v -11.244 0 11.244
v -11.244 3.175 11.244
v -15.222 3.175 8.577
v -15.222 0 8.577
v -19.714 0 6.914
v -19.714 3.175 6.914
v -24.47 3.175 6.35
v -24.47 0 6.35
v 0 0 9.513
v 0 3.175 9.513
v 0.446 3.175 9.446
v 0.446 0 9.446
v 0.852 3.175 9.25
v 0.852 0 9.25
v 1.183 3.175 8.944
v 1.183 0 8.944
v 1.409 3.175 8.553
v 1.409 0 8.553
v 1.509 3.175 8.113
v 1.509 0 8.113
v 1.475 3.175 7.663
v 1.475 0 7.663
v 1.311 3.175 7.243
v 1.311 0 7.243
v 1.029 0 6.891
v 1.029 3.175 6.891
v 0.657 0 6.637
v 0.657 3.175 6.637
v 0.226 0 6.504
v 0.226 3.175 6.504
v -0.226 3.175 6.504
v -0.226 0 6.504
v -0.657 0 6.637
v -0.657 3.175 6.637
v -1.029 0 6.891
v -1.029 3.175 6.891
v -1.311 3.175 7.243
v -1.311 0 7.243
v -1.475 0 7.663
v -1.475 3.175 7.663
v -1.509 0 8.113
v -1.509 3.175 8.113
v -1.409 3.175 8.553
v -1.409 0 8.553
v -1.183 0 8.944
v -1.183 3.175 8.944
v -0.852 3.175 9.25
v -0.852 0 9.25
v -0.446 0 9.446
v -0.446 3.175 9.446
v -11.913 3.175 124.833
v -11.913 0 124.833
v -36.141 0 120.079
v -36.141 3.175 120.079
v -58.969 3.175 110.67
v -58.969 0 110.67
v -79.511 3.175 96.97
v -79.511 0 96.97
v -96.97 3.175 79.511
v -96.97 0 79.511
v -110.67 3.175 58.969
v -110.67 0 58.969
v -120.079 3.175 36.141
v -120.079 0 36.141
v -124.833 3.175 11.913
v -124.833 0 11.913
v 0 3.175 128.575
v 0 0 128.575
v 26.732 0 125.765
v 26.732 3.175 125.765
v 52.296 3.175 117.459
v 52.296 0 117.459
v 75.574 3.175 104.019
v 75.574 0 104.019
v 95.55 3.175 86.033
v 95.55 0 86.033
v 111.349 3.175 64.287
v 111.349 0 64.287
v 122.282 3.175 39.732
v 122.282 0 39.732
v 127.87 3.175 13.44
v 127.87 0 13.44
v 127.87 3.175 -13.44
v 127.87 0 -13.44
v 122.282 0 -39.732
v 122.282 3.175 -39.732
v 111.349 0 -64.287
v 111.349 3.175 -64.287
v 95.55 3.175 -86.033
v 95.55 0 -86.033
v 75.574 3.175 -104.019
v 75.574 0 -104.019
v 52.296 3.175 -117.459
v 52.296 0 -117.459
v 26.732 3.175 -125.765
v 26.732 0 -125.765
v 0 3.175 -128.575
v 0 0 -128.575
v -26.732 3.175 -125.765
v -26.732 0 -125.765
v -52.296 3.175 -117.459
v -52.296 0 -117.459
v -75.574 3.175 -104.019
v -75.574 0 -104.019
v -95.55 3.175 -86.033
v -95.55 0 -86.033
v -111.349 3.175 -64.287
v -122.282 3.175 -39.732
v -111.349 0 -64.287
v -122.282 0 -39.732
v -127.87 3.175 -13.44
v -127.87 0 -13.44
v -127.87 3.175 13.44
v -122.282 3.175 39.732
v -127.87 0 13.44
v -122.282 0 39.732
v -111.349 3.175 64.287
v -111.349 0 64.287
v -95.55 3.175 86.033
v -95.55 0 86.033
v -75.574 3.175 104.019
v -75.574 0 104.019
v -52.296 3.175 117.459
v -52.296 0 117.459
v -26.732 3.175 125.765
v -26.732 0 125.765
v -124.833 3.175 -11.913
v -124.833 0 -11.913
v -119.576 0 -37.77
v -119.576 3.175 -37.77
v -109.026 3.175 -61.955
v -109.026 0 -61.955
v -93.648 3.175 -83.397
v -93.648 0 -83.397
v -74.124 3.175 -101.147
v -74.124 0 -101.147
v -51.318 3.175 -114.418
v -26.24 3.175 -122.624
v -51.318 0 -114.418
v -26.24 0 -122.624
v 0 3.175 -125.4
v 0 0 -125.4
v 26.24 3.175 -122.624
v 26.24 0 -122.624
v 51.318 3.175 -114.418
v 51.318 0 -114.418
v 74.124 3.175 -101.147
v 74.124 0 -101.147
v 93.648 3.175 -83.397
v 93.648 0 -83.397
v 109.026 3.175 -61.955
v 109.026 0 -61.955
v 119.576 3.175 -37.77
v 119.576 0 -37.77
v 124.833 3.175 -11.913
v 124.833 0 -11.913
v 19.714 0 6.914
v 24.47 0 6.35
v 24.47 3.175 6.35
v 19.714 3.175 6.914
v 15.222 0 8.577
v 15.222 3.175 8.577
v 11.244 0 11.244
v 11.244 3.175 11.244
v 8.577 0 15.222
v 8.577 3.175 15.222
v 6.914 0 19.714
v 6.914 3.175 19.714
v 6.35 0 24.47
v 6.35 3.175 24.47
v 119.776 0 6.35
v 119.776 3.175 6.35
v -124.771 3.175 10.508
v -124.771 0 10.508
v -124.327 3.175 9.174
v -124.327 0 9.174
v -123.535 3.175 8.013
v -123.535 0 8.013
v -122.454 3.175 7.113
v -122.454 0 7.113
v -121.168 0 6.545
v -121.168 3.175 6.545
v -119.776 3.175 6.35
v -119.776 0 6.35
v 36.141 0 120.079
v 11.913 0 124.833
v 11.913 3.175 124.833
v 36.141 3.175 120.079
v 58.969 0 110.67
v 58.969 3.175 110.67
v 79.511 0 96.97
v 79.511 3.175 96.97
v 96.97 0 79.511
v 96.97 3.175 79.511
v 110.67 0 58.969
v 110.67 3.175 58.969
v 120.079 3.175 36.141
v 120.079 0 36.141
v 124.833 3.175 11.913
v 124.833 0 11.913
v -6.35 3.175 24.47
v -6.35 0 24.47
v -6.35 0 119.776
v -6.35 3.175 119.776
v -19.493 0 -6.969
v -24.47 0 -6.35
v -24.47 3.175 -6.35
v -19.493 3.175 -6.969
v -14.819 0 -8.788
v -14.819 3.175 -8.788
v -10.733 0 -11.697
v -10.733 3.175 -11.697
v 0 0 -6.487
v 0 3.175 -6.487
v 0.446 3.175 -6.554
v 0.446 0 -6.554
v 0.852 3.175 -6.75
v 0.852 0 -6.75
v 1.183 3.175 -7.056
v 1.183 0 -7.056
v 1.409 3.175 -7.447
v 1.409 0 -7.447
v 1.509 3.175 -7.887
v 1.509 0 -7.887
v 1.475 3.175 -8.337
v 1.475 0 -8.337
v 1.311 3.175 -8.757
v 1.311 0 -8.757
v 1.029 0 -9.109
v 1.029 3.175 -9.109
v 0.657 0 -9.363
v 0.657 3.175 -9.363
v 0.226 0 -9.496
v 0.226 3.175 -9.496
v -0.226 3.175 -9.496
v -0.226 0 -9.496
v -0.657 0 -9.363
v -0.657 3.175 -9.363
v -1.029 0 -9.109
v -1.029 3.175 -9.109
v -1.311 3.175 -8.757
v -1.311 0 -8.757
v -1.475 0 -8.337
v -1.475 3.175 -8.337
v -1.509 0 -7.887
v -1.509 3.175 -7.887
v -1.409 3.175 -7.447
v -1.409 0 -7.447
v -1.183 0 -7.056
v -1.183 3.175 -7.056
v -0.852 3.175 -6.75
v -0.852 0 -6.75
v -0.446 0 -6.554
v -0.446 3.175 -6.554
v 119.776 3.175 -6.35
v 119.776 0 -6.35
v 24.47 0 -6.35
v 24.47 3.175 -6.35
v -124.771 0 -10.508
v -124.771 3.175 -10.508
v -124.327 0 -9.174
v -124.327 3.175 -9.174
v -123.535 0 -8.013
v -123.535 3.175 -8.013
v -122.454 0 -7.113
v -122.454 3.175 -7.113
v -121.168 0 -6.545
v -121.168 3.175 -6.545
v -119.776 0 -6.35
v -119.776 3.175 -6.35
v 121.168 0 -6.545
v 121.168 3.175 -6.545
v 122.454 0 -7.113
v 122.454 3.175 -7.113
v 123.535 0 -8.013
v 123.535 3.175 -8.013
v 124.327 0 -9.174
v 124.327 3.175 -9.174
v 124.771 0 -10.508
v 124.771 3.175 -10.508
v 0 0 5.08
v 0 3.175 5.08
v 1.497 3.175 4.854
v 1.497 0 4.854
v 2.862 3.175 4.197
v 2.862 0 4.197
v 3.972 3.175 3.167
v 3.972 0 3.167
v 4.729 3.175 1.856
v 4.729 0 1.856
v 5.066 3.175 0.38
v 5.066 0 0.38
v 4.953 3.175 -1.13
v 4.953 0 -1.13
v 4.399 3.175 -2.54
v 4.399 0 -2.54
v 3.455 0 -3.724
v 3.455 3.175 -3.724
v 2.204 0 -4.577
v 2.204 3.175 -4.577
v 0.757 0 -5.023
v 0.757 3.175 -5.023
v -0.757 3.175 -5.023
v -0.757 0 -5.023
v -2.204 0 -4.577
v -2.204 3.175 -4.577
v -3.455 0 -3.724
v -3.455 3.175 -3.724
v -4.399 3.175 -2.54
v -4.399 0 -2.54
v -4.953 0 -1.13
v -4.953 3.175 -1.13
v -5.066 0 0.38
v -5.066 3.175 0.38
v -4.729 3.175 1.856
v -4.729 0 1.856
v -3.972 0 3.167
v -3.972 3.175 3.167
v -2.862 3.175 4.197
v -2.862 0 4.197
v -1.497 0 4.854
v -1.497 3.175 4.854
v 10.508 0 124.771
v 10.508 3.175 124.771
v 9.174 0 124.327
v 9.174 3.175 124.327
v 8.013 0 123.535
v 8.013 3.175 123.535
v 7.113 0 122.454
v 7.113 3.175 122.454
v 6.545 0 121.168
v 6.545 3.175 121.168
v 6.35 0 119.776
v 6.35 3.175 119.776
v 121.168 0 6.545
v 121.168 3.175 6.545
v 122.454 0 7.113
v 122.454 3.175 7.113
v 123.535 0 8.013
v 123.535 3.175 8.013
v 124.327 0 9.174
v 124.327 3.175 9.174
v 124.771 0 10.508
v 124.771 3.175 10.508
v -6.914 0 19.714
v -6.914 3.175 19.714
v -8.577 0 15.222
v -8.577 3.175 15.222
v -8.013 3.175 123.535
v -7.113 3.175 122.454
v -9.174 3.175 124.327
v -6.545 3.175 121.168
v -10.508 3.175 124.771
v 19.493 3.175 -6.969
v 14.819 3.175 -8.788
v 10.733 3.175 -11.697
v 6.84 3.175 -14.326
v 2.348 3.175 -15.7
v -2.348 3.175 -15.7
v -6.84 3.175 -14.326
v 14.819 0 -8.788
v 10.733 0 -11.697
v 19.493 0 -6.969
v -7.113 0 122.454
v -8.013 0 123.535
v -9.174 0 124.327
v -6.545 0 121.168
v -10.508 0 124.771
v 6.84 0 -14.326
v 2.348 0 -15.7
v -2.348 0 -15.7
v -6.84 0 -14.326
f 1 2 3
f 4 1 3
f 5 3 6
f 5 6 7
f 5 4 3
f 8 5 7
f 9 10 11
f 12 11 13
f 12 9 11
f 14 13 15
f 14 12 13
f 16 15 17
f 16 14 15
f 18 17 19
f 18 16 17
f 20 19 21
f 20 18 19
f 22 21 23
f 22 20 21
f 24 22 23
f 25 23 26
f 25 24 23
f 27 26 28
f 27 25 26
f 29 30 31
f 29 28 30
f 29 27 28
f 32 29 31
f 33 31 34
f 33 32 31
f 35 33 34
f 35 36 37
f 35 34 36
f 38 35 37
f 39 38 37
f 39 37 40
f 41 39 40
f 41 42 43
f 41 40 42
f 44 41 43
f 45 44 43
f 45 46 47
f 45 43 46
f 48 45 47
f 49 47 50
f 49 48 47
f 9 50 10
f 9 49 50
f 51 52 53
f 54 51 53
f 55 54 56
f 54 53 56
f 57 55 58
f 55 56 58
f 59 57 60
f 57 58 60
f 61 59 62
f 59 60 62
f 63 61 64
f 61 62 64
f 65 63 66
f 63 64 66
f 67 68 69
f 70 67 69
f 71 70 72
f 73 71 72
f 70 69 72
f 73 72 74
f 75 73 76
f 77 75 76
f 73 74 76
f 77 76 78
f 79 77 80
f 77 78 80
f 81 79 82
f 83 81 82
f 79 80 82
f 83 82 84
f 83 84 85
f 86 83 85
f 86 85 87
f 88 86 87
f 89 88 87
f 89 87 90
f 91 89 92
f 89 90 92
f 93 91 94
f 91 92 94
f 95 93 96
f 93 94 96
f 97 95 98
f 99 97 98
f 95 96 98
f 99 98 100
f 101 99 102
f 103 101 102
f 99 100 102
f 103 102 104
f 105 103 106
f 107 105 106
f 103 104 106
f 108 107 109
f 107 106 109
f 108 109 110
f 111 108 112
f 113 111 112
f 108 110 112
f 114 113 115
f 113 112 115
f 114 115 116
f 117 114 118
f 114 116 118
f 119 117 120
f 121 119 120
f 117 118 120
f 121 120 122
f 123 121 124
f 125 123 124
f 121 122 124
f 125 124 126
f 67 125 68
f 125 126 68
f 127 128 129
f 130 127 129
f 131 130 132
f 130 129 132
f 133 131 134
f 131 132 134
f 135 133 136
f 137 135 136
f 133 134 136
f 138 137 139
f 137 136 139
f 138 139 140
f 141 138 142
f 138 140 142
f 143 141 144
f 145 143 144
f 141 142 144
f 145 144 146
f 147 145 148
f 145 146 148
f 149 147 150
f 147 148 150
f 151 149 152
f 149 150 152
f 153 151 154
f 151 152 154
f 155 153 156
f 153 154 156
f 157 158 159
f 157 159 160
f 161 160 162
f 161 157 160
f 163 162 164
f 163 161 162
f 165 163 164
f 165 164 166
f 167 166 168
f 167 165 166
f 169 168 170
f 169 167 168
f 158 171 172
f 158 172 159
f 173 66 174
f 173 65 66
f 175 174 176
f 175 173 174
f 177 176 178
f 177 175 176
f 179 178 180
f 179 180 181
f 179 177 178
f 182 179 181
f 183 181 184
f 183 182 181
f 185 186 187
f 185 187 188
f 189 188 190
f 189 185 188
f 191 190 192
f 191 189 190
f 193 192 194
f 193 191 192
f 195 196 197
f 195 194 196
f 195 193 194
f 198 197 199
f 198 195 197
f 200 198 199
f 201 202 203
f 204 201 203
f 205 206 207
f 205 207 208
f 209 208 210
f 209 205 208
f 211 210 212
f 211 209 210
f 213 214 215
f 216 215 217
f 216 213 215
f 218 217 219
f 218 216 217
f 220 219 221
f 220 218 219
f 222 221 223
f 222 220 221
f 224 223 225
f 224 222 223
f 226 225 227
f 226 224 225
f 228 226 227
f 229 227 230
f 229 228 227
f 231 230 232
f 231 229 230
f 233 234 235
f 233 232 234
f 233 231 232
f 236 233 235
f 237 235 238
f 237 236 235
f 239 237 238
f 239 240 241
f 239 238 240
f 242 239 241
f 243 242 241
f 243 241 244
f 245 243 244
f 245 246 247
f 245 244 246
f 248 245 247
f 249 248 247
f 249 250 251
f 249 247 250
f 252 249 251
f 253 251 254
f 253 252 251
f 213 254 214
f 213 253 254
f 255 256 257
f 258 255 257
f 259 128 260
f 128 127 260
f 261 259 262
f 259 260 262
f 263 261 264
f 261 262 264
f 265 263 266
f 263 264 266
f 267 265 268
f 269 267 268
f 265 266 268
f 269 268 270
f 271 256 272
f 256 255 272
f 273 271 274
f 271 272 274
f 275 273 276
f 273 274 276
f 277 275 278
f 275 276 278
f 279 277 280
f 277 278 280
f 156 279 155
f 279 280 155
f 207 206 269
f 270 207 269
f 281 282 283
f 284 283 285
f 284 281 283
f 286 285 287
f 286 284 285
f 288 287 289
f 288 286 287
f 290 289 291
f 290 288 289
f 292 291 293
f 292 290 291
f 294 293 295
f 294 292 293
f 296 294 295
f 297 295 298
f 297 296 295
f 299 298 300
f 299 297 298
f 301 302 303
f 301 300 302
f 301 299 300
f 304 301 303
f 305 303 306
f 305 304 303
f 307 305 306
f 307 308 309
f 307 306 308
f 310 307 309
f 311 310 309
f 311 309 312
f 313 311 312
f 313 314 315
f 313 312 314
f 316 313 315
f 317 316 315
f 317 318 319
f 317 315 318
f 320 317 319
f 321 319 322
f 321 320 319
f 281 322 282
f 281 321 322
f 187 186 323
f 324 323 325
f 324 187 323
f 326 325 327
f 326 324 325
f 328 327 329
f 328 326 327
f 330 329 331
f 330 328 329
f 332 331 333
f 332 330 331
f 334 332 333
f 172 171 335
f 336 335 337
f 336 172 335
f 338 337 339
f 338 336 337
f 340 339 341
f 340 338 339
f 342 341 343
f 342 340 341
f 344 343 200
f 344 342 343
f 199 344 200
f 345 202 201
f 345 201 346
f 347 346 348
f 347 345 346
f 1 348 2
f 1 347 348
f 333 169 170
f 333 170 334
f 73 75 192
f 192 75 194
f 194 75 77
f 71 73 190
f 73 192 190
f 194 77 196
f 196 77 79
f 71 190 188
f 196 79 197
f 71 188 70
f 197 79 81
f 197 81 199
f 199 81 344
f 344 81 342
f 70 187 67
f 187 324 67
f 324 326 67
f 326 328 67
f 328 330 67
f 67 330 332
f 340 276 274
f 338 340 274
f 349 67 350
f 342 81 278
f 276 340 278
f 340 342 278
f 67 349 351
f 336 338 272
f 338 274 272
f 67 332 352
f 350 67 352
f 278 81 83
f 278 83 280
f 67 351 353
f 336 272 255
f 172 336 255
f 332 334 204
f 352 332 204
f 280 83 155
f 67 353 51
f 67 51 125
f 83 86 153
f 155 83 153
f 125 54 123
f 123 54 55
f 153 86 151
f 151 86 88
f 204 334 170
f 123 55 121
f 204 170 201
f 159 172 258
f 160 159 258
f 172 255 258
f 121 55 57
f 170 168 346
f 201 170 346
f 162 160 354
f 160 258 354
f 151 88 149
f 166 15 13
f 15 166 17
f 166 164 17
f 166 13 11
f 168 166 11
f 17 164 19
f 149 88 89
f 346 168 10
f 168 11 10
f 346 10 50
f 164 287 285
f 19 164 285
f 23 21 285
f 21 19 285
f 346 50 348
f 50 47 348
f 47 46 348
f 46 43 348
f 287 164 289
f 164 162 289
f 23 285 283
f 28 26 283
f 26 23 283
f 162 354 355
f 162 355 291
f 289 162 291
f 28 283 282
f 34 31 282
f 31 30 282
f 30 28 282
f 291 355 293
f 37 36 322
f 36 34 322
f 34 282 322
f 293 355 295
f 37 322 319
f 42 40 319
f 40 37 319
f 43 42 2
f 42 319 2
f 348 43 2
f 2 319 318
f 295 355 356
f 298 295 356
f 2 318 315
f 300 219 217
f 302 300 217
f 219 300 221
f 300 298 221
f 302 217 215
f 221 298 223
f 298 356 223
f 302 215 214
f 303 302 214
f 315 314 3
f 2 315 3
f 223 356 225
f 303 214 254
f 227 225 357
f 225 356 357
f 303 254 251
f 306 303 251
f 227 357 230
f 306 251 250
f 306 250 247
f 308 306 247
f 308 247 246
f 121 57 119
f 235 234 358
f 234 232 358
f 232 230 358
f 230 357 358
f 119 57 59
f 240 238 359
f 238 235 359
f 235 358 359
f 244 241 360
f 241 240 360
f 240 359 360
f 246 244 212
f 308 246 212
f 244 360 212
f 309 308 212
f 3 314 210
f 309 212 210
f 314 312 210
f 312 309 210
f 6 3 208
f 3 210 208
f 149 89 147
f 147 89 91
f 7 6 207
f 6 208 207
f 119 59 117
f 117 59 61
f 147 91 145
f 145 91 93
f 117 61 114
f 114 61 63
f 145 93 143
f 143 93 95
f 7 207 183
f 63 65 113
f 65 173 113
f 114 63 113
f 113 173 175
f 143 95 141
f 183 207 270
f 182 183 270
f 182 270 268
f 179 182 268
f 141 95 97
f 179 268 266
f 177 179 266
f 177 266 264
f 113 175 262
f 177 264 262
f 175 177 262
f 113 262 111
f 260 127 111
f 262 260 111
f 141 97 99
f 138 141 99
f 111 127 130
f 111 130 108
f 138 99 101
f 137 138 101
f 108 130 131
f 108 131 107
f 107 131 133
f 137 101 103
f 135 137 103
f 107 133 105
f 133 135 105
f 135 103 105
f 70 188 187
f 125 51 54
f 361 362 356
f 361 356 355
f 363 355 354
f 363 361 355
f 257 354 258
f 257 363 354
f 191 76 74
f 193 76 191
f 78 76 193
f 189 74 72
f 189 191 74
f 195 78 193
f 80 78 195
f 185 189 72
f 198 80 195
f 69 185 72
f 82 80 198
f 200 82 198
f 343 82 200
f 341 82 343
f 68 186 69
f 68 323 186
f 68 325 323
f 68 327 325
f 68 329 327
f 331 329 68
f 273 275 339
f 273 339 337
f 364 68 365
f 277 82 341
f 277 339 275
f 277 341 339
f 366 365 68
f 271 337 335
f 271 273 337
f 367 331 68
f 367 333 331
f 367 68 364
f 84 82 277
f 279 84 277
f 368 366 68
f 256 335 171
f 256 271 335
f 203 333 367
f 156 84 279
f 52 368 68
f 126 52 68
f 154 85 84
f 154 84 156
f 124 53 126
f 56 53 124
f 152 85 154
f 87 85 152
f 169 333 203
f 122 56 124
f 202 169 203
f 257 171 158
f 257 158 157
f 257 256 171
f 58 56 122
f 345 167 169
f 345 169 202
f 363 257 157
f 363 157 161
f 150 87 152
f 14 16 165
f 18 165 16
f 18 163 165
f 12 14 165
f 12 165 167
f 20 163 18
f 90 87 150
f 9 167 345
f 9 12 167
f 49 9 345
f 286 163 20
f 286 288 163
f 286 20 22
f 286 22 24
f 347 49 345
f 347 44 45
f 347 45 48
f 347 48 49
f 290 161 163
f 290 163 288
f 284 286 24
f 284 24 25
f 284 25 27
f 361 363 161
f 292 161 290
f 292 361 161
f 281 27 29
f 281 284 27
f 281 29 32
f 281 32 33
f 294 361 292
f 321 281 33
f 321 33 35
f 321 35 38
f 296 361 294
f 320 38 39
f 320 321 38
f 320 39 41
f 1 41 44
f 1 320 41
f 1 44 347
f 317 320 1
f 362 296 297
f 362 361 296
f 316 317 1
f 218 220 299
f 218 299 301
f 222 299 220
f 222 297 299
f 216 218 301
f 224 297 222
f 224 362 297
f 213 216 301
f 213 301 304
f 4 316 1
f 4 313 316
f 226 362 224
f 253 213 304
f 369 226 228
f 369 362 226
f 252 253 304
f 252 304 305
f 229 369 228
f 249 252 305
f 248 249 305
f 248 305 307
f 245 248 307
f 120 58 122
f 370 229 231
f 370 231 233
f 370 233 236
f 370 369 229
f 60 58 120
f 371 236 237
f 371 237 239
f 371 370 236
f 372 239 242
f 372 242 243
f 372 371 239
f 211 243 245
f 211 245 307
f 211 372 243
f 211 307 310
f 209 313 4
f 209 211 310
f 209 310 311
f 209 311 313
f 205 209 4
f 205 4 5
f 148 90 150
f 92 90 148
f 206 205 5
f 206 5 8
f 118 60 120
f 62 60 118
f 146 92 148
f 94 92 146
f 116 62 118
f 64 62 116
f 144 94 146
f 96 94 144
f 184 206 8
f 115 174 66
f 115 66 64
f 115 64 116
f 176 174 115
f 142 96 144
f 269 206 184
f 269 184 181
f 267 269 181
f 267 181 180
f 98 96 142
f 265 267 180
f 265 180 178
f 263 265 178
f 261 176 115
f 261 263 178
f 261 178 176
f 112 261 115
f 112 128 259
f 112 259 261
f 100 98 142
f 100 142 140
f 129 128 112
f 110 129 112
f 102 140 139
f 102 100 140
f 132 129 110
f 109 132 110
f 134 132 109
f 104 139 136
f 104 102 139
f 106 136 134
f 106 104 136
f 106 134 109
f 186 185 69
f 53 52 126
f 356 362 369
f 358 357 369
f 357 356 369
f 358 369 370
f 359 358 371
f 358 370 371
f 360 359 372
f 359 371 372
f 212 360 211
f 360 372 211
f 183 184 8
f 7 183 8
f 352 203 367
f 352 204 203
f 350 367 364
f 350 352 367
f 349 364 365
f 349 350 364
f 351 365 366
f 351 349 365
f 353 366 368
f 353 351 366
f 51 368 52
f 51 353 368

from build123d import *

# Parameters (mm, degrees)
SKETCH4_R           = 128.5748
BOSS_EXTRUDE1_DEPTH = 3.175
CUT_EXTRUDE2_DEPTH  = 182.859943404
SCREW_HOLES_R       = 1.513296856
SCREW_HOLES_R_2     = 5.08
MIDDLE_HOLES_DEPTH  = 182.859943404
FILLETMIDDLE_R      = 20.32
FILLETSIDES_R       = 5.08


with BuildPart() as part:
    # Sketch4 → Boss-Extrude1 (new body)
    with BuildSketch(Plane(origin=(0, 0, 0), x_dir=(1, 0, 0), z_dir=(0, 1, 0))):
        with Locations(Location((0, 0, 0), (0, 0, 270))):
            Circle(SKETCH4_R)
    extrude(amount=BOSS_EXTRUDE1_DEPTH)

    # Sketch1 → Cut-Extrude2 (cut, through all)
    with BuildSketch(Plane(origin=(0, 0, 0), x_dir=(1, 0, 0), z_dir=(0, 1, 0))):
        with BuildLine():
            Line((-14.549677831, 6.35), (-125.238921027, 6.35))
            ThreePointArc((-125.238921027, 6.35), (0, 125.3998), (125.238921027, 6.35))
            Line((125.238921027, 6.35), (14.549677831, 6.35))
            ThreePointArc((14.549677831, 6.35), (0, 15.875), (-14.549677831, 6.35))
        make_face()
        with BuildLine():
            Line((125.238921027, -6.35), (14.549677831, -6.35))
            ThreePointArc((14.549677831, -6.35), (11.225320151, -11.225320151), (6.35, -14.549677831))
            Line((6.35, -14.549677831), (6.35, -125.238921027))
            ThreePointArc((6.35, -125.238921027), (88.671048939, -88.671048939), (125.238921027, -6.35))
        make_face()
        with BuildLine():
            Line((-6.35, -14.549677831), (-6.35, -125.238921027))
            ThreePointArc((-6.35, -125.238921027), (-88.671048939, -88.671048939), (-125.238921027, -6.35))
            Line((-125.238921027, -6.35), (-14.549677831, -6.35))
            ThreePointArc((-14.549677831, -6.35), (-11.225320151, -11.225320151), (-6.35, -14.549677831))
        make_face()
    extrude(amount=CUT_EXTRUDE2_DEPTH, mode=Mode.SUBTRACT)

    # Screw holes → middle holes (cut, through all)
    with BuildSketch(Plane(origin=(0, 0, 0), x_dir=(1, 0, 0), z_dir=(0, 1, 0))):
        with Locations(Location((0, 8, 0), (0, 0, 270))):
            Circle(SCREW_HOLES_R)
        with Locations(Location((0, -8, 0), (0, 0, 270))):
            Circle(SCREW_HOLES_R)
        with Locations(Location((0, 0, 0), (0, 0, 270))):
            Circle(SCREW_HOLES_R_2)
    extrude(amount=MIDDLE_HOLES_DEPTH, mode=Mode.SUBTRACT)

    # Filletmiddle
    # the kernel refuses this fillet: 20.32 mm, written as the material it adds along each edge
    with BuildSketch(Plane(origin=(-14.549677831, 0, -6.35), x_dir=(-1, 0, 0), z_dir=(0, 1, 0)), Plane(origin=(14.549677831, 0, 6.35), x_dir=(1, 0, 0), z_dir=(0, 1, 0)), Plane(origin=(-6.35, 0, 14.549677831), x_dir=(0, 0, 1), z_dir=(0, 1, 0))) as filletmiddle_piece_1:
        with BuildLine():
            CenterArc((9.920490231, -20.32), FILLETMIDDLE_R, 90, 42.536898363)
            ThreePointArc((-3.81714798, -5.347368421), (-1.628915718, -2.873314556), (0, 0))
            Line((0, 0), (9.920490231, 0))
        make_face()
    extrude(amount=3.175)
    with BuildSketch(Plane(origin=(14.549677831, 0, -6.35), x_dir=(1, 0, 0), z_dir=(0, 1, 0)), Plane(origin=(-14.549677831, 0, 6.35), x_dir=(-1, 0, 0), z_dir=(0, 1, 0))) as filletmiddle_piece_2:
        with BuildLine():
            CenterArc((9.920490231, 20.32), FILLETMIDDLE_R, 227.463101637, 42.536898363)
            ThreePointArc((-3.81714798, 5.347368421), (-1.628915718, 2.873314556), (0, 0))
            Line((0, 0), (9.920490231, 0))
        make_face()
    extrude(amount=3.175)
    with BuildSketch(Plane(origin=(6.35, 0, 14.549677831), x_dir=(0.8139062748674819, 0, -0.580996192527403), z_dir=(0, 1, 0))) as filletmiddle_piece_3:
        with BuildLine():
            CenterArc((10.774808453, -19.880191881), FILLETMIDDLE_R, 101.942461579, 42.536898363)
            Line((-5.763767052, -8.074349249), (0, 0))
            ThreePointArc((0, 0), (3.285002577, -0.343600093), (6.570005154, 0))
        make_face()
    extrude(amount=3.175)

    # Filletsides
    filletsides_edges = [part.edges().sort_by_distance(p)[0] for p in [
        (125.238921027, 1.5875, -6.35),
        (-125.238921027, 1.5875, -6.35),
        (6.35, 1.5875, 125.238921027),
        (125.238921027, 1.5875, 6.35),
        (-125.238921027, 1.5875, 6.35),
        (-6.35, 1.5875, 125.238921027),
    ]]
    fillet(filletsides_edges, radius=FILLETSIDES_R)


solid = part.part
